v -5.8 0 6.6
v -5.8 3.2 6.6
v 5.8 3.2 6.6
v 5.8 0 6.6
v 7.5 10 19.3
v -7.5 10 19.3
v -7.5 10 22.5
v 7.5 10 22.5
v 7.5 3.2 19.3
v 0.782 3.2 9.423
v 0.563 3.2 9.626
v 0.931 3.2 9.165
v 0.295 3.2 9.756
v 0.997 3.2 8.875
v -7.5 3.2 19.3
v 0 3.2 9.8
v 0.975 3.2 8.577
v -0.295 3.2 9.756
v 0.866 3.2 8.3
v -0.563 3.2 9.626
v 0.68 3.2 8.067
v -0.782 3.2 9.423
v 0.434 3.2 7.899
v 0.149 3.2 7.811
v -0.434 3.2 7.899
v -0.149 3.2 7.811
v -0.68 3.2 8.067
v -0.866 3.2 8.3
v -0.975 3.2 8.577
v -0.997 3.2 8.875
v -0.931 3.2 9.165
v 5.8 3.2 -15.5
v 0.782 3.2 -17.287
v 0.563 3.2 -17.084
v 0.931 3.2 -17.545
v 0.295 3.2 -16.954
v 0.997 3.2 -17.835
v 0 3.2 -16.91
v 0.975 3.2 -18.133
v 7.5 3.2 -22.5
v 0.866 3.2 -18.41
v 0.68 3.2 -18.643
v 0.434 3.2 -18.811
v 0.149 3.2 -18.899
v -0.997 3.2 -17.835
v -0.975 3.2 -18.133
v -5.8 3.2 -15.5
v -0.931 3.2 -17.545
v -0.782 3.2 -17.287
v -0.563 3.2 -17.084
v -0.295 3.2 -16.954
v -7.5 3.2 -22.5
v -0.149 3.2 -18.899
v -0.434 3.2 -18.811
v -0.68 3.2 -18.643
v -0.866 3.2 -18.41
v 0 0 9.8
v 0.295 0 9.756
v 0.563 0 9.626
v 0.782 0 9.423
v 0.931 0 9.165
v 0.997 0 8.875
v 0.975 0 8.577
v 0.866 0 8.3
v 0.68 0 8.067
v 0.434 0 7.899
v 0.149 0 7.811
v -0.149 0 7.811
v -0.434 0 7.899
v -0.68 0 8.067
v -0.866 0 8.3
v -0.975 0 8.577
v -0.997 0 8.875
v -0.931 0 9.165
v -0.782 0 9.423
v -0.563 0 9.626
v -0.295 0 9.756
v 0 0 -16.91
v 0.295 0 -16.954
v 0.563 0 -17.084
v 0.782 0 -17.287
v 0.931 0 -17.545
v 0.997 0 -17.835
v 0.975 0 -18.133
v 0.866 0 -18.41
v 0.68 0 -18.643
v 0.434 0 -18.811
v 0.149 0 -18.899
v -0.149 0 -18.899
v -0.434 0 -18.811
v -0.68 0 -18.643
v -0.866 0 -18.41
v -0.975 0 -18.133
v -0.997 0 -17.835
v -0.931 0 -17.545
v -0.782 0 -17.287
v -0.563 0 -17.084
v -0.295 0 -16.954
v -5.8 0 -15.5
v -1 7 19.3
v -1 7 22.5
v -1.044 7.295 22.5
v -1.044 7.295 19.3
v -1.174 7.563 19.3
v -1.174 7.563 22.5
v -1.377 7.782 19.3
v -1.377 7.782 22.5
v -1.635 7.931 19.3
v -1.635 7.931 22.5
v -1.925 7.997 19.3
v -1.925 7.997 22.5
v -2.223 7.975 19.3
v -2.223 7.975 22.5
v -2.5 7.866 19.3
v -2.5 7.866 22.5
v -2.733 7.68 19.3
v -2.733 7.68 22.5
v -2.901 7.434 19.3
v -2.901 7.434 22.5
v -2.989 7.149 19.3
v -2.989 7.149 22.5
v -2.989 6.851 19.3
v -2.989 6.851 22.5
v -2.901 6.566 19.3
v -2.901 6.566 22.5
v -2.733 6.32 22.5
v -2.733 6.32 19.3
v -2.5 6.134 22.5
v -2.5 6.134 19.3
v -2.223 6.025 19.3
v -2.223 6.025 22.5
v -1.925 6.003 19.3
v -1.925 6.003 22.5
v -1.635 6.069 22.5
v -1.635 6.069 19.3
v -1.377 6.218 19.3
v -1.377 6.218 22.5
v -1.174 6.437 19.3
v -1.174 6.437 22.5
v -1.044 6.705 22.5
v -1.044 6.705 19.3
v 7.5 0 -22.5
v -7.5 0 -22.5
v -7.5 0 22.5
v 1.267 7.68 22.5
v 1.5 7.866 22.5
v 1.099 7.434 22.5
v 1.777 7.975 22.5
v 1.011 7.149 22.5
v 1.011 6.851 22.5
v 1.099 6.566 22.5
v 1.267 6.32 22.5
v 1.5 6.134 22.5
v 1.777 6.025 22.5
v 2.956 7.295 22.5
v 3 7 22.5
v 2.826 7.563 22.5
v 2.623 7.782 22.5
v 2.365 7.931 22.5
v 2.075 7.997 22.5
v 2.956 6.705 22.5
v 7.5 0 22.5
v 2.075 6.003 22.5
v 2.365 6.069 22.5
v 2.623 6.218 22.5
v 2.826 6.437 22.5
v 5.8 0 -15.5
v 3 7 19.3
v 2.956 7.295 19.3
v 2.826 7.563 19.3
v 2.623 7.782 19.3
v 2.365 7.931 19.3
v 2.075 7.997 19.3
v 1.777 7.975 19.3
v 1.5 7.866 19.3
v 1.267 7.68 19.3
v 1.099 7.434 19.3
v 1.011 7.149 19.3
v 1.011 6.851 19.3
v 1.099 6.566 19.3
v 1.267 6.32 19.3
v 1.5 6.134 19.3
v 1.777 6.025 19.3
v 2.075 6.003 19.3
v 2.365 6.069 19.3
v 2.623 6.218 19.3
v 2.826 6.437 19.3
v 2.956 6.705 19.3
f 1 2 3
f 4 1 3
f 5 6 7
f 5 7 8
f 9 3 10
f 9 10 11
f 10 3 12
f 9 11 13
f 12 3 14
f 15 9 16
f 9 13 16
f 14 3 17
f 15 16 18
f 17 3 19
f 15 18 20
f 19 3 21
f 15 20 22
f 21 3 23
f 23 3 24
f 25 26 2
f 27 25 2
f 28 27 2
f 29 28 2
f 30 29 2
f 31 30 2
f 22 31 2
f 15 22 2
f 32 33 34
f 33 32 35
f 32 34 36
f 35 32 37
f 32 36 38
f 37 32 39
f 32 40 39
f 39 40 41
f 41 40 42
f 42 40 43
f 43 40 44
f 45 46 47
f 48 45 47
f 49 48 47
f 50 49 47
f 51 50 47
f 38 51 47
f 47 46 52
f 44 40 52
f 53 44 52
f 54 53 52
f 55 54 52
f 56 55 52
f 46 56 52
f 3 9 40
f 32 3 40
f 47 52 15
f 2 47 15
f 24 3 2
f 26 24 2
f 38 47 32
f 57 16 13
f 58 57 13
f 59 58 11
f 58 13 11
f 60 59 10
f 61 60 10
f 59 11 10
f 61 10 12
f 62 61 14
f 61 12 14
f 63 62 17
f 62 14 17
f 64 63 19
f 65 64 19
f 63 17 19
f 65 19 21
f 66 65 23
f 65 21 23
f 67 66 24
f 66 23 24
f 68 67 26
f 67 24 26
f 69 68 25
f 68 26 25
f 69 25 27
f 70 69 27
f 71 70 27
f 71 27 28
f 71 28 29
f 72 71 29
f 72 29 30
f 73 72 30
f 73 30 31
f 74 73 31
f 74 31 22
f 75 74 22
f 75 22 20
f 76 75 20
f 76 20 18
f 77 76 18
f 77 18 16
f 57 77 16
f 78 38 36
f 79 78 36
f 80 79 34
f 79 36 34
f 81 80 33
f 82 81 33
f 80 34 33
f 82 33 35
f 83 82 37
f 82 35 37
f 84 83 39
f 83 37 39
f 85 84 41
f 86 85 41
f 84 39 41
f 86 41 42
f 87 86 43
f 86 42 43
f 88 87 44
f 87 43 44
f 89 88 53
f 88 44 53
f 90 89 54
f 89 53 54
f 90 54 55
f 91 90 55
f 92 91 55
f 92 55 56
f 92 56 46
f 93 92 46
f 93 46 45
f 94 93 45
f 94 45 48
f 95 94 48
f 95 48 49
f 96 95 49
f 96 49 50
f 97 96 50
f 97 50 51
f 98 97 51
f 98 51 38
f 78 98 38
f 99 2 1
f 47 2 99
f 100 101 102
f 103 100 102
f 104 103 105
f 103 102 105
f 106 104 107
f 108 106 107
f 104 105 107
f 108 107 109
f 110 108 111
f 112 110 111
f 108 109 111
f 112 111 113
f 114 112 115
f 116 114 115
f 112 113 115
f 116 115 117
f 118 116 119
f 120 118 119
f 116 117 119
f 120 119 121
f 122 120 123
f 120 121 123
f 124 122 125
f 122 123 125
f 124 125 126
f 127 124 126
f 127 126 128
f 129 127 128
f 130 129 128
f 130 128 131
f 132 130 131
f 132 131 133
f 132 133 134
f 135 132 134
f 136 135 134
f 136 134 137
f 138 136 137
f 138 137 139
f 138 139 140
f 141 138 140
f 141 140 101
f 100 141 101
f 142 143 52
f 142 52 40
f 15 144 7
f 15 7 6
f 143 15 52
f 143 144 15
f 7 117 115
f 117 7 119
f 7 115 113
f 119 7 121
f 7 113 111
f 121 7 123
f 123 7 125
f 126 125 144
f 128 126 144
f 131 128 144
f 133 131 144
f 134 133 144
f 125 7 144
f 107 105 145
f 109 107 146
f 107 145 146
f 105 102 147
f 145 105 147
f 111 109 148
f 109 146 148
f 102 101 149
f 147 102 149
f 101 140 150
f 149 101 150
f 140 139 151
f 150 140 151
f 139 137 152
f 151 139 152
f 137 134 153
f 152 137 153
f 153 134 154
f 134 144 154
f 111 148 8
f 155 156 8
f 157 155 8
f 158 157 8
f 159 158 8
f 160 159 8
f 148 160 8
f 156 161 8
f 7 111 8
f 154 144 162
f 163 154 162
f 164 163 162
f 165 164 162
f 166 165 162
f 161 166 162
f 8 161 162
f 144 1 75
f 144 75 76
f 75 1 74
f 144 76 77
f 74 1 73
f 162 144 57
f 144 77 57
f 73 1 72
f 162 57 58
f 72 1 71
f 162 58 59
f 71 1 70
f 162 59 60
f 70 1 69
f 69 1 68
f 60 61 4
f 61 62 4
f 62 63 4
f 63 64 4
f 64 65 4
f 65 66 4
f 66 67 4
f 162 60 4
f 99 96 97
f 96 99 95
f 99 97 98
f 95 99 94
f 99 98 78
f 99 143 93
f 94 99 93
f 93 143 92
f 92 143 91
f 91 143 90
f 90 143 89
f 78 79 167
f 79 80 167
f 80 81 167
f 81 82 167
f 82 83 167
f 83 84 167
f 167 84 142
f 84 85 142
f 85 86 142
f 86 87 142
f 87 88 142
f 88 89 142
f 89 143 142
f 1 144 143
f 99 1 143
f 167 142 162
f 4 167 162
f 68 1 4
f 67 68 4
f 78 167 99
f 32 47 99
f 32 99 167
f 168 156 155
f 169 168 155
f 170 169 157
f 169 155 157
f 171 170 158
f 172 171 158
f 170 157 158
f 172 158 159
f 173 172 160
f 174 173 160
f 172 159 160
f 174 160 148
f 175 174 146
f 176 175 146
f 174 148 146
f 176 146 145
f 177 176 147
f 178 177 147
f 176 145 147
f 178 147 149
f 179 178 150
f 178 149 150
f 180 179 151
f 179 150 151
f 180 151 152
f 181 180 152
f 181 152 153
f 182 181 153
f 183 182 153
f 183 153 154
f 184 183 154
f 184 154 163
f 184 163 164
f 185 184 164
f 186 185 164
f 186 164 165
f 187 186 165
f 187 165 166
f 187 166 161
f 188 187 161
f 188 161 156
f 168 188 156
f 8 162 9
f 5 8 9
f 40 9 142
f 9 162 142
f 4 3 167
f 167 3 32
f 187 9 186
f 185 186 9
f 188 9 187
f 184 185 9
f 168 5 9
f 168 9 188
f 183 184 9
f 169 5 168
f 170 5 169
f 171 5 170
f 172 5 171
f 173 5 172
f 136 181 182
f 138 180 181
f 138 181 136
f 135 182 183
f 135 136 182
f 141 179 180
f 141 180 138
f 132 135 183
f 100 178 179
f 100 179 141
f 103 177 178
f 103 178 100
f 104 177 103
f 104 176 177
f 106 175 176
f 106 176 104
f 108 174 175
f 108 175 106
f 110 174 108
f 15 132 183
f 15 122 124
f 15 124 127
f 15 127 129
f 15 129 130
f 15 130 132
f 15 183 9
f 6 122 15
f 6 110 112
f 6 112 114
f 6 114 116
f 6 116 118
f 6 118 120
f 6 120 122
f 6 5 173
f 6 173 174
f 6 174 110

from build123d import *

# Parameters (mm, degrees)
SKETCH1_W           = 15
SKETCH1_H           = 45
BOSS_EXTRUDE1_DEPTH = 10
SKETCH4_W           = 15
SKETCH4_H           = 6.8
CUT_EXTRUDE2_DEPTH  = 41.8
SKETCH5_R           = 1
CUT_EXTRUDE3_DEPTH  = 47.703854231
SKETCH6_R           = 1
SKETCH6_W           = 11.6
SKETCH6_H           = 22.1
CUT_EXTRUDE4_DEPTH  = 25.67265693


with BuildPart() as part:
    # Sketch1 → Boss-Extrude1 (new body)
    with BuildSketch(Plane(origin=(0, 0, 0), x_dir=(1, 0, 0), z_dir=(0, 1, 0))):
        Rectangle(SKETCH1_W, SKETCH1_H)
    extrude(amount=BOSS_EXTRUDE1_DEPTH)

    # Sketch4 → Cut-Extrude2 (cut)
    with BuildSketch(Plane(origin=(0, 0, -22.5), x_dir=(-1, 0, 0), z_dir=(0, 0, -1))):
        with Locations((0, 6.6)):
            Rectangle(SKETCH4_W, SKETCH4_H)
    extrude(amount=-CUT_EXTRUDE2_DEPTH, mode=Mode.SUBTRACT)

    # Sketch5 → Cut-Extrude3 (cut, through all)
    with BuildSketch(Plane.XY.offset(22.5)):
        with Locations((-2, 7)):
            Circle(SKETCH5_R)
        with Locations((2, 7)):
            Circle(SKETCH5_R)
    extrude(amount=-CUT_EXTRUDE3_DEPTH, mode=Mode.SUBTRACT)

    # Sketch6 → Cut-Extrude4 (cut, through all)
    with BuildSketch(Plane(origin=(0, 3.2, 0), x_dir=(1, 0, 0), z_dir=(0, 1, 0))):
        with Locations(Location((0, -8.8, 0), (0, 0, 270))):
            Circle(SKETCH6_R)
        with Locations(Location((0, 17.91, 0), (0, 0, 270))):
            Circle(SKETCH6_R)
        with Locations((0, 4.45)):
            Rectangle(SKETCH6_W, SKETCH6_H)
    extrude(amount=-CUT_EXTRUDE4_DEPTH, mode=Mode.SUBTRACT)


solid = part.part
